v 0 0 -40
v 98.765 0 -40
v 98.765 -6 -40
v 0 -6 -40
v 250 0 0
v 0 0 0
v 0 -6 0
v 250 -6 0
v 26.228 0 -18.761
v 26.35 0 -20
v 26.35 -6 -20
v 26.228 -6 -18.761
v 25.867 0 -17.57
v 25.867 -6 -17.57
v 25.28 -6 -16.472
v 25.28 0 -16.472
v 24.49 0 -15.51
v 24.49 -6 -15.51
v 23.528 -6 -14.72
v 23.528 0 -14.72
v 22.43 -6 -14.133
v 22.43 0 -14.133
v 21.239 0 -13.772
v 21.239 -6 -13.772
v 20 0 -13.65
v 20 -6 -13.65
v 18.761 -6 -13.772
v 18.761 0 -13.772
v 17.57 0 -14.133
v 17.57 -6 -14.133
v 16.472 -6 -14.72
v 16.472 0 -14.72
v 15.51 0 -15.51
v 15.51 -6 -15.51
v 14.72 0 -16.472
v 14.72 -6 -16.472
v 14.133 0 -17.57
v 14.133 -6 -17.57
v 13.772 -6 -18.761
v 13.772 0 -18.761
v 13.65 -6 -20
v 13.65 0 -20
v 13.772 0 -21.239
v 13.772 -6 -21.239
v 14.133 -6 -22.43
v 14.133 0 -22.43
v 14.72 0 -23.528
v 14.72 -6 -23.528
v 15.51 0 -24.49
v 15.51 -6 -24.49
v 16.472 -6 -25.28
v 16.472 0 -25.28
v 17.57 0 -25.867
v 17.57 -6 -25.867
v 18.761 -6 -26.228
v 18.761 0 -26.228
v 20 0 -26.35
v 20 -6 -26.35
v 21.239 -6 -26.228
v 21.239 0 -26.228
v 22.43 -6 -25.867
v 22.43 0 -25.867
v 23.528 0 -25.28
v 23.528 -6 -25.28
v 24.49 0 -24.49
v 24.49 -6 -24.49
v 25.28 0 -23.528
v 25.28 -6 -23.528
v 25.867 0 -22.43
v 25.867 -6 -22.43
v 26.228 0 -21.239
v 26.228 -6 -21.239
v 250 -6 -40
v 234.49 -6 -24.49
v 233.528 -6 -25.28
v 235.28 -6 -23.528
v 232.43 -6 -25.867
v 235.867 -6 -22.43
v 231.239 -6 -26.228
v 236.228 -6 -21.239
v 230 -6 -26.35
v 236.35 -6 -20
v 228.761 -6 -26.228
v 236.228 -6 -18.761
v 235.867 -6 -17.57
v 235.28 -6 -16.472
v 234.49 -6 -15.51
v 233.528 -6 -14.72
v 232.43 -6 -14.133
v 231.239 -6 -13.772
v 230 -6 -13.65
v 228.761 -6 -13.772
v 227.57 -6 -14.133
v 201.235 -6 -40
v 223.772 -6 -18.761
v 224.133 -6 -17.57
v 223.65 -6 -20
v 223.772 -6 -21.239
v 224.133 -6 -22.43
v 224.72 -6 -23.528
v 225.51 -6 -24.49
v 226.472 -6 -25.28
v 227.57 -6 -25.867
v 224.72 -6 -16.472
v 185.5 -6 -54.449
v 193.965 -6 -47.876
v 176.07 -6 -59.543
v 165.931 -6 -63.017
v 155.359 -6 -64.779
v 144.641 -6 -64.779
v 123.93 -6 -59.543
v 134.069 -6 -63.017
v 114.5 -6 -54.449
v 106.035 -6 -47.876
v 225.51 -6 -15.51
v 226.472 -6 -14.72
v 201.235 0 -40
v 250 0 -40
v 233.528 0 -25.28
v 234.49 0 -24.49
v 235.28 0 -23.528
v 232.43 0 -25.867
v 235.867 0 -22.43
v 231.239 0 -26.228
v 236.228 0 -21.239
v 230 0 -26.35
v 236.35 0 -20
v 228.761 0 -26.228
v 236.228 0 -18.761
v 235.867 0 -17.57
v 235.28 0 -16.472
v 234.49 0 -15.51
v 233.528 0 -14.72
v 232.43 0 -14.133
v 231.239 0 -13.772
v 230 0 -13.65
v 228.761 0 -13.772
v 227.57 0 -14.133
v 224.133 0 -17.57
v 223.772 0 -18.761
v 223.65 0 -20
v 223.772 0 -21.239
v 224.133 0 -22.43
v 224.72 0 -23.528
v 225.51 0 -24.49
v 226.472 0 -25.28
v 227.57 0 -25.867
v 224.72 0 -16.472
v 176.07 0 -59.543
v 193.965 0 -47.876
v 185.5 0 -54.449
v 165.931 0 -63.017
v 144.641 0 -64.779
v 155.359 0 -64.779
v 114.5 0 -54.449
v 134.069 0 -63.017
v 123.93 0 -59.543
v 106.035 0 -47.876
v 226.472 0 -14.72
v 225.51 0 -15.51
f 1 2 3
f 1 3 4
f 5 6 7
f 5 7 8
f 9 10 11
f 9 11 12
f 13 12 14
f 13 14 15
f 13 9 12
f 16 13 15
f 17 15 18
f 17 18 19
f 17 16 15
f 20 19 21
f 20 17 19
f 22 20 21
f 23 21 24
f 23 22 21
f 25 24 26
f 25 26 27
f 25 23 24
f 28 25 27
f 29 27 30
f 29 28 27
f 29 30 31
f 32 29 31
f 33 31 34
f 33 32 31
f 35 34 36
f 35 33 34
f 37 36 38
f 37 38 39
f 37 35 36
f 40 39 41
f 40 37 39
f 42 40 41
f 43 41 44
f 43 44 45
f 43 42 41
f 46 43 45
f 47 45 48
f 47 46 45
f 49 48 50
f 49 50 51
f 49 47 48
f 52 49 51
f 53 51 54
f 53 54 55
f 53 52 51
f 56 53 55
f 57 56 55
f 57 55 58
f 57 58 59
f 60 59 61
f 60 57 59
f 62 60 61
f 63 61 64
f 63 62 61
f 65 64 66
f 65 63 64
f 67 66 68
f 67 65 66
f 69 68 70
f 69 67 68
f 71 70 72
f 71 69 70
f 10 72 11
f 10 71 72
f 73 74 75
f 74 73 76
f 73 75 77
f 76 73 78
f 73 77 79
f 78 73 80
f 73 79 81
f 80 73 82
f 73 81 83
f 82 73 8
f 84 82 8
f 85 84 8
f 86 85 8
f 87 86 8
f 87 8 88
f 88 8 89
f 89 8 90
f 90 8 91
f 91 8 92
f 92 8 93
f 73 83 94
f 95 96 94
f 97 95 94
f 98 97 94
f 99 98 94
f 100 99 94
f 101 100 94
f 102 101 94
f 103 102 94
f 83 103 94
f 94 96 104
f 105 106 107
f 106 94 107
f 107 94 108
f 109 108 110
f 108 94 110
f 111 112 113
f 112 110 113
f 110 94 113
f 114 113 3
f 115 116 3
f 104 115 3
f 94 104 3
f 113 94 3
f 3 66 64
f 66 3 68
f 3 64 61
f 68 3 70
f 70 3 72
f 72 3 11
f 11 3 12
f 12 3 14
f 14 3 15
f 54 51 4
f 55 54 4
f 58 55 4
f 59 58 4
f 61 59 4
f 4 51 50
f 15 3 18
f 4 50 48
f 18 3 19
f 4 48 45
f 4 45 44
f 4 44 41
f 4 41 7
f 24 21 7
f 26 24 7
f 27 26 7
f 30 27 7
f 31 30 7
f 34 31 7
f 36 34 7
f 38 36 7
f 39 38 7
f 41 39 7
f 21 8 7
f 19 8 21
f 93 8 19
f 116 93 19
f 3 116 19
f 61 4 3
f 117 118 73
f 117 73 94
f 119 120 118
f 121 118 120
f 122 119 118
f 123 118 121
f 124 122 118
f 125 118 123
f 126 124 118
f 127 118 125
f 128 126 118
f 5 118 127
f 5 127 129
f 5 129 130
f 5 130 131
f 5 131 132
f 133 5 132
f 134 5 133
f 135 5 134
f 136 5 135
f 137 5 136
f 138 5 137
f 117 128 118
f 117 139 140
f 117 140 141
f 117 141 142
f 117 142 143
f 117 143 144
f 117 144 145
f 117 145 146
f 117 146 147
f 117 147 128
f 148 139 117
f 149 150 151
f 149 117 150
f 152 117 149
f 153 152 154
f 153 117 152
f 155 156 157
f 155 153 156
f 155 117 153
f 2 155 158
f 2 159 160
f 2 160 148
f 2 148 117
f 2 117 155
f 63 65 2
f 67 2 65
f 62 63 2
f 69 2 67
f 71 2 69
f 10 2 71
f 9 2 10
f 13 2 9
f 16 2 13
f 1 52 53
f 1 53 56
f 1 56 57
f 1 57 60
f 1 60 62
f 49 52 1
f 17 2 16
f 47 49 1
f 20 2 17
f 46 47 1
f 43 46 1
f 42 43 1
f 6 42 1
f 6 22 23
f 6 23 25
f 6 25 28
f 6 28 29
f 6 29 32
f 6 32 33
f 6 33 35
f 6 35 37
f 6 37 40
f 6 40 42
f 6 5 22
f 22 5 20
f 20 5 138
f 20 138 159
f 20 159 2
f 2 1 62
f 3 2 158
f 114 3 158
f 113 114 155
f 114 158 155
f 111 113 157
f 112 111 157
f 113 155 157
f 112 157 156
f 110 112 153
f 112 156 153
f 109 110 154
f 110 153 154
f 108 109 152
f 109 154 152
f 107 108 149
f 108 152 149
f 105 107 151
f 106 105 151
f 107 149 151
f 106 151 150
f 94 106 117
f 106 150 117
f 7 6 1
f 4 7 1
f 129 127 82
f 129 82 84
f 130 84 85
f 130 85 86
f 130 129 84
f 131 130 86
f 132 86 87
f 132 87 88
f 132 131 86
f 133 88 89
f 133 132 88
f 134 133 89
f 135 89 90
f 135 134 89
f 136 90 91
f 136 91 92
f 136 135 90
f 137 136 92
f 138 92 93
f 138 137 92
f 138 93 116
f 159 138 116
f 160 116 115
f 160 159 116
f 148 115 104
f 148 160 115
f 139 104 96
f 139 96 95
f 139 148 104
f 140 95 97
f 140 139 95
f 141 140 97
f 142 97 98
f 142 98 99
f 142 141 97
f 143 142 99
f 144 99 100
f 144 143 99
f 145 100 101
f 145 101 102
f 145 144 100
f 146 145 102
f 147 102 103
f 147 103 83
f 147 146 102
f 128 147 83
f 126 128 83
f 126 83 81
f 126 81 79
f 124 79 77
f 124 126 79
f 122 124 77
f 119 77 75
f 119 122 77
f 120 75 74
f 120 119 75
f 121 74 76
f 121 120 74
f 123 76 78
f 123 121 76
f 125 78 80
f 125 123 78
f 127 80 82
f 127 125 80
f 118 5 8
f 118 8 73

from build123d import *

# Parameters (mm, degrees)
SKETCH_R  = 6.35
PAD_DEPTH = 6


with BuildPart() as part:
    # Sketch → Pad (new body)
    with BuildSketch(Plane.XZ):
        with BuildLine():
            Line((0, 0), (250, 0))
            Line((250, 0), (250, -40))
            Line((250, -40), (201.234754, -40))
            ThreePointArc((98.765246, -40), (150, -65), (201.234754, -40))
            Line((98.765246, -40), (0, -40))
            Line((0, 0), (0, -40))
        make_face()
        with Locations((20, -20)):
            Circle(SKETCH_R, mode=Mode.SUBTRACT)
        with Locations((230, -20)):
            Circle(SKETCH_R, mode=Mode.SUBTRACT)
    extrude(amount=PAD_DEPTH)


solid = part.part
